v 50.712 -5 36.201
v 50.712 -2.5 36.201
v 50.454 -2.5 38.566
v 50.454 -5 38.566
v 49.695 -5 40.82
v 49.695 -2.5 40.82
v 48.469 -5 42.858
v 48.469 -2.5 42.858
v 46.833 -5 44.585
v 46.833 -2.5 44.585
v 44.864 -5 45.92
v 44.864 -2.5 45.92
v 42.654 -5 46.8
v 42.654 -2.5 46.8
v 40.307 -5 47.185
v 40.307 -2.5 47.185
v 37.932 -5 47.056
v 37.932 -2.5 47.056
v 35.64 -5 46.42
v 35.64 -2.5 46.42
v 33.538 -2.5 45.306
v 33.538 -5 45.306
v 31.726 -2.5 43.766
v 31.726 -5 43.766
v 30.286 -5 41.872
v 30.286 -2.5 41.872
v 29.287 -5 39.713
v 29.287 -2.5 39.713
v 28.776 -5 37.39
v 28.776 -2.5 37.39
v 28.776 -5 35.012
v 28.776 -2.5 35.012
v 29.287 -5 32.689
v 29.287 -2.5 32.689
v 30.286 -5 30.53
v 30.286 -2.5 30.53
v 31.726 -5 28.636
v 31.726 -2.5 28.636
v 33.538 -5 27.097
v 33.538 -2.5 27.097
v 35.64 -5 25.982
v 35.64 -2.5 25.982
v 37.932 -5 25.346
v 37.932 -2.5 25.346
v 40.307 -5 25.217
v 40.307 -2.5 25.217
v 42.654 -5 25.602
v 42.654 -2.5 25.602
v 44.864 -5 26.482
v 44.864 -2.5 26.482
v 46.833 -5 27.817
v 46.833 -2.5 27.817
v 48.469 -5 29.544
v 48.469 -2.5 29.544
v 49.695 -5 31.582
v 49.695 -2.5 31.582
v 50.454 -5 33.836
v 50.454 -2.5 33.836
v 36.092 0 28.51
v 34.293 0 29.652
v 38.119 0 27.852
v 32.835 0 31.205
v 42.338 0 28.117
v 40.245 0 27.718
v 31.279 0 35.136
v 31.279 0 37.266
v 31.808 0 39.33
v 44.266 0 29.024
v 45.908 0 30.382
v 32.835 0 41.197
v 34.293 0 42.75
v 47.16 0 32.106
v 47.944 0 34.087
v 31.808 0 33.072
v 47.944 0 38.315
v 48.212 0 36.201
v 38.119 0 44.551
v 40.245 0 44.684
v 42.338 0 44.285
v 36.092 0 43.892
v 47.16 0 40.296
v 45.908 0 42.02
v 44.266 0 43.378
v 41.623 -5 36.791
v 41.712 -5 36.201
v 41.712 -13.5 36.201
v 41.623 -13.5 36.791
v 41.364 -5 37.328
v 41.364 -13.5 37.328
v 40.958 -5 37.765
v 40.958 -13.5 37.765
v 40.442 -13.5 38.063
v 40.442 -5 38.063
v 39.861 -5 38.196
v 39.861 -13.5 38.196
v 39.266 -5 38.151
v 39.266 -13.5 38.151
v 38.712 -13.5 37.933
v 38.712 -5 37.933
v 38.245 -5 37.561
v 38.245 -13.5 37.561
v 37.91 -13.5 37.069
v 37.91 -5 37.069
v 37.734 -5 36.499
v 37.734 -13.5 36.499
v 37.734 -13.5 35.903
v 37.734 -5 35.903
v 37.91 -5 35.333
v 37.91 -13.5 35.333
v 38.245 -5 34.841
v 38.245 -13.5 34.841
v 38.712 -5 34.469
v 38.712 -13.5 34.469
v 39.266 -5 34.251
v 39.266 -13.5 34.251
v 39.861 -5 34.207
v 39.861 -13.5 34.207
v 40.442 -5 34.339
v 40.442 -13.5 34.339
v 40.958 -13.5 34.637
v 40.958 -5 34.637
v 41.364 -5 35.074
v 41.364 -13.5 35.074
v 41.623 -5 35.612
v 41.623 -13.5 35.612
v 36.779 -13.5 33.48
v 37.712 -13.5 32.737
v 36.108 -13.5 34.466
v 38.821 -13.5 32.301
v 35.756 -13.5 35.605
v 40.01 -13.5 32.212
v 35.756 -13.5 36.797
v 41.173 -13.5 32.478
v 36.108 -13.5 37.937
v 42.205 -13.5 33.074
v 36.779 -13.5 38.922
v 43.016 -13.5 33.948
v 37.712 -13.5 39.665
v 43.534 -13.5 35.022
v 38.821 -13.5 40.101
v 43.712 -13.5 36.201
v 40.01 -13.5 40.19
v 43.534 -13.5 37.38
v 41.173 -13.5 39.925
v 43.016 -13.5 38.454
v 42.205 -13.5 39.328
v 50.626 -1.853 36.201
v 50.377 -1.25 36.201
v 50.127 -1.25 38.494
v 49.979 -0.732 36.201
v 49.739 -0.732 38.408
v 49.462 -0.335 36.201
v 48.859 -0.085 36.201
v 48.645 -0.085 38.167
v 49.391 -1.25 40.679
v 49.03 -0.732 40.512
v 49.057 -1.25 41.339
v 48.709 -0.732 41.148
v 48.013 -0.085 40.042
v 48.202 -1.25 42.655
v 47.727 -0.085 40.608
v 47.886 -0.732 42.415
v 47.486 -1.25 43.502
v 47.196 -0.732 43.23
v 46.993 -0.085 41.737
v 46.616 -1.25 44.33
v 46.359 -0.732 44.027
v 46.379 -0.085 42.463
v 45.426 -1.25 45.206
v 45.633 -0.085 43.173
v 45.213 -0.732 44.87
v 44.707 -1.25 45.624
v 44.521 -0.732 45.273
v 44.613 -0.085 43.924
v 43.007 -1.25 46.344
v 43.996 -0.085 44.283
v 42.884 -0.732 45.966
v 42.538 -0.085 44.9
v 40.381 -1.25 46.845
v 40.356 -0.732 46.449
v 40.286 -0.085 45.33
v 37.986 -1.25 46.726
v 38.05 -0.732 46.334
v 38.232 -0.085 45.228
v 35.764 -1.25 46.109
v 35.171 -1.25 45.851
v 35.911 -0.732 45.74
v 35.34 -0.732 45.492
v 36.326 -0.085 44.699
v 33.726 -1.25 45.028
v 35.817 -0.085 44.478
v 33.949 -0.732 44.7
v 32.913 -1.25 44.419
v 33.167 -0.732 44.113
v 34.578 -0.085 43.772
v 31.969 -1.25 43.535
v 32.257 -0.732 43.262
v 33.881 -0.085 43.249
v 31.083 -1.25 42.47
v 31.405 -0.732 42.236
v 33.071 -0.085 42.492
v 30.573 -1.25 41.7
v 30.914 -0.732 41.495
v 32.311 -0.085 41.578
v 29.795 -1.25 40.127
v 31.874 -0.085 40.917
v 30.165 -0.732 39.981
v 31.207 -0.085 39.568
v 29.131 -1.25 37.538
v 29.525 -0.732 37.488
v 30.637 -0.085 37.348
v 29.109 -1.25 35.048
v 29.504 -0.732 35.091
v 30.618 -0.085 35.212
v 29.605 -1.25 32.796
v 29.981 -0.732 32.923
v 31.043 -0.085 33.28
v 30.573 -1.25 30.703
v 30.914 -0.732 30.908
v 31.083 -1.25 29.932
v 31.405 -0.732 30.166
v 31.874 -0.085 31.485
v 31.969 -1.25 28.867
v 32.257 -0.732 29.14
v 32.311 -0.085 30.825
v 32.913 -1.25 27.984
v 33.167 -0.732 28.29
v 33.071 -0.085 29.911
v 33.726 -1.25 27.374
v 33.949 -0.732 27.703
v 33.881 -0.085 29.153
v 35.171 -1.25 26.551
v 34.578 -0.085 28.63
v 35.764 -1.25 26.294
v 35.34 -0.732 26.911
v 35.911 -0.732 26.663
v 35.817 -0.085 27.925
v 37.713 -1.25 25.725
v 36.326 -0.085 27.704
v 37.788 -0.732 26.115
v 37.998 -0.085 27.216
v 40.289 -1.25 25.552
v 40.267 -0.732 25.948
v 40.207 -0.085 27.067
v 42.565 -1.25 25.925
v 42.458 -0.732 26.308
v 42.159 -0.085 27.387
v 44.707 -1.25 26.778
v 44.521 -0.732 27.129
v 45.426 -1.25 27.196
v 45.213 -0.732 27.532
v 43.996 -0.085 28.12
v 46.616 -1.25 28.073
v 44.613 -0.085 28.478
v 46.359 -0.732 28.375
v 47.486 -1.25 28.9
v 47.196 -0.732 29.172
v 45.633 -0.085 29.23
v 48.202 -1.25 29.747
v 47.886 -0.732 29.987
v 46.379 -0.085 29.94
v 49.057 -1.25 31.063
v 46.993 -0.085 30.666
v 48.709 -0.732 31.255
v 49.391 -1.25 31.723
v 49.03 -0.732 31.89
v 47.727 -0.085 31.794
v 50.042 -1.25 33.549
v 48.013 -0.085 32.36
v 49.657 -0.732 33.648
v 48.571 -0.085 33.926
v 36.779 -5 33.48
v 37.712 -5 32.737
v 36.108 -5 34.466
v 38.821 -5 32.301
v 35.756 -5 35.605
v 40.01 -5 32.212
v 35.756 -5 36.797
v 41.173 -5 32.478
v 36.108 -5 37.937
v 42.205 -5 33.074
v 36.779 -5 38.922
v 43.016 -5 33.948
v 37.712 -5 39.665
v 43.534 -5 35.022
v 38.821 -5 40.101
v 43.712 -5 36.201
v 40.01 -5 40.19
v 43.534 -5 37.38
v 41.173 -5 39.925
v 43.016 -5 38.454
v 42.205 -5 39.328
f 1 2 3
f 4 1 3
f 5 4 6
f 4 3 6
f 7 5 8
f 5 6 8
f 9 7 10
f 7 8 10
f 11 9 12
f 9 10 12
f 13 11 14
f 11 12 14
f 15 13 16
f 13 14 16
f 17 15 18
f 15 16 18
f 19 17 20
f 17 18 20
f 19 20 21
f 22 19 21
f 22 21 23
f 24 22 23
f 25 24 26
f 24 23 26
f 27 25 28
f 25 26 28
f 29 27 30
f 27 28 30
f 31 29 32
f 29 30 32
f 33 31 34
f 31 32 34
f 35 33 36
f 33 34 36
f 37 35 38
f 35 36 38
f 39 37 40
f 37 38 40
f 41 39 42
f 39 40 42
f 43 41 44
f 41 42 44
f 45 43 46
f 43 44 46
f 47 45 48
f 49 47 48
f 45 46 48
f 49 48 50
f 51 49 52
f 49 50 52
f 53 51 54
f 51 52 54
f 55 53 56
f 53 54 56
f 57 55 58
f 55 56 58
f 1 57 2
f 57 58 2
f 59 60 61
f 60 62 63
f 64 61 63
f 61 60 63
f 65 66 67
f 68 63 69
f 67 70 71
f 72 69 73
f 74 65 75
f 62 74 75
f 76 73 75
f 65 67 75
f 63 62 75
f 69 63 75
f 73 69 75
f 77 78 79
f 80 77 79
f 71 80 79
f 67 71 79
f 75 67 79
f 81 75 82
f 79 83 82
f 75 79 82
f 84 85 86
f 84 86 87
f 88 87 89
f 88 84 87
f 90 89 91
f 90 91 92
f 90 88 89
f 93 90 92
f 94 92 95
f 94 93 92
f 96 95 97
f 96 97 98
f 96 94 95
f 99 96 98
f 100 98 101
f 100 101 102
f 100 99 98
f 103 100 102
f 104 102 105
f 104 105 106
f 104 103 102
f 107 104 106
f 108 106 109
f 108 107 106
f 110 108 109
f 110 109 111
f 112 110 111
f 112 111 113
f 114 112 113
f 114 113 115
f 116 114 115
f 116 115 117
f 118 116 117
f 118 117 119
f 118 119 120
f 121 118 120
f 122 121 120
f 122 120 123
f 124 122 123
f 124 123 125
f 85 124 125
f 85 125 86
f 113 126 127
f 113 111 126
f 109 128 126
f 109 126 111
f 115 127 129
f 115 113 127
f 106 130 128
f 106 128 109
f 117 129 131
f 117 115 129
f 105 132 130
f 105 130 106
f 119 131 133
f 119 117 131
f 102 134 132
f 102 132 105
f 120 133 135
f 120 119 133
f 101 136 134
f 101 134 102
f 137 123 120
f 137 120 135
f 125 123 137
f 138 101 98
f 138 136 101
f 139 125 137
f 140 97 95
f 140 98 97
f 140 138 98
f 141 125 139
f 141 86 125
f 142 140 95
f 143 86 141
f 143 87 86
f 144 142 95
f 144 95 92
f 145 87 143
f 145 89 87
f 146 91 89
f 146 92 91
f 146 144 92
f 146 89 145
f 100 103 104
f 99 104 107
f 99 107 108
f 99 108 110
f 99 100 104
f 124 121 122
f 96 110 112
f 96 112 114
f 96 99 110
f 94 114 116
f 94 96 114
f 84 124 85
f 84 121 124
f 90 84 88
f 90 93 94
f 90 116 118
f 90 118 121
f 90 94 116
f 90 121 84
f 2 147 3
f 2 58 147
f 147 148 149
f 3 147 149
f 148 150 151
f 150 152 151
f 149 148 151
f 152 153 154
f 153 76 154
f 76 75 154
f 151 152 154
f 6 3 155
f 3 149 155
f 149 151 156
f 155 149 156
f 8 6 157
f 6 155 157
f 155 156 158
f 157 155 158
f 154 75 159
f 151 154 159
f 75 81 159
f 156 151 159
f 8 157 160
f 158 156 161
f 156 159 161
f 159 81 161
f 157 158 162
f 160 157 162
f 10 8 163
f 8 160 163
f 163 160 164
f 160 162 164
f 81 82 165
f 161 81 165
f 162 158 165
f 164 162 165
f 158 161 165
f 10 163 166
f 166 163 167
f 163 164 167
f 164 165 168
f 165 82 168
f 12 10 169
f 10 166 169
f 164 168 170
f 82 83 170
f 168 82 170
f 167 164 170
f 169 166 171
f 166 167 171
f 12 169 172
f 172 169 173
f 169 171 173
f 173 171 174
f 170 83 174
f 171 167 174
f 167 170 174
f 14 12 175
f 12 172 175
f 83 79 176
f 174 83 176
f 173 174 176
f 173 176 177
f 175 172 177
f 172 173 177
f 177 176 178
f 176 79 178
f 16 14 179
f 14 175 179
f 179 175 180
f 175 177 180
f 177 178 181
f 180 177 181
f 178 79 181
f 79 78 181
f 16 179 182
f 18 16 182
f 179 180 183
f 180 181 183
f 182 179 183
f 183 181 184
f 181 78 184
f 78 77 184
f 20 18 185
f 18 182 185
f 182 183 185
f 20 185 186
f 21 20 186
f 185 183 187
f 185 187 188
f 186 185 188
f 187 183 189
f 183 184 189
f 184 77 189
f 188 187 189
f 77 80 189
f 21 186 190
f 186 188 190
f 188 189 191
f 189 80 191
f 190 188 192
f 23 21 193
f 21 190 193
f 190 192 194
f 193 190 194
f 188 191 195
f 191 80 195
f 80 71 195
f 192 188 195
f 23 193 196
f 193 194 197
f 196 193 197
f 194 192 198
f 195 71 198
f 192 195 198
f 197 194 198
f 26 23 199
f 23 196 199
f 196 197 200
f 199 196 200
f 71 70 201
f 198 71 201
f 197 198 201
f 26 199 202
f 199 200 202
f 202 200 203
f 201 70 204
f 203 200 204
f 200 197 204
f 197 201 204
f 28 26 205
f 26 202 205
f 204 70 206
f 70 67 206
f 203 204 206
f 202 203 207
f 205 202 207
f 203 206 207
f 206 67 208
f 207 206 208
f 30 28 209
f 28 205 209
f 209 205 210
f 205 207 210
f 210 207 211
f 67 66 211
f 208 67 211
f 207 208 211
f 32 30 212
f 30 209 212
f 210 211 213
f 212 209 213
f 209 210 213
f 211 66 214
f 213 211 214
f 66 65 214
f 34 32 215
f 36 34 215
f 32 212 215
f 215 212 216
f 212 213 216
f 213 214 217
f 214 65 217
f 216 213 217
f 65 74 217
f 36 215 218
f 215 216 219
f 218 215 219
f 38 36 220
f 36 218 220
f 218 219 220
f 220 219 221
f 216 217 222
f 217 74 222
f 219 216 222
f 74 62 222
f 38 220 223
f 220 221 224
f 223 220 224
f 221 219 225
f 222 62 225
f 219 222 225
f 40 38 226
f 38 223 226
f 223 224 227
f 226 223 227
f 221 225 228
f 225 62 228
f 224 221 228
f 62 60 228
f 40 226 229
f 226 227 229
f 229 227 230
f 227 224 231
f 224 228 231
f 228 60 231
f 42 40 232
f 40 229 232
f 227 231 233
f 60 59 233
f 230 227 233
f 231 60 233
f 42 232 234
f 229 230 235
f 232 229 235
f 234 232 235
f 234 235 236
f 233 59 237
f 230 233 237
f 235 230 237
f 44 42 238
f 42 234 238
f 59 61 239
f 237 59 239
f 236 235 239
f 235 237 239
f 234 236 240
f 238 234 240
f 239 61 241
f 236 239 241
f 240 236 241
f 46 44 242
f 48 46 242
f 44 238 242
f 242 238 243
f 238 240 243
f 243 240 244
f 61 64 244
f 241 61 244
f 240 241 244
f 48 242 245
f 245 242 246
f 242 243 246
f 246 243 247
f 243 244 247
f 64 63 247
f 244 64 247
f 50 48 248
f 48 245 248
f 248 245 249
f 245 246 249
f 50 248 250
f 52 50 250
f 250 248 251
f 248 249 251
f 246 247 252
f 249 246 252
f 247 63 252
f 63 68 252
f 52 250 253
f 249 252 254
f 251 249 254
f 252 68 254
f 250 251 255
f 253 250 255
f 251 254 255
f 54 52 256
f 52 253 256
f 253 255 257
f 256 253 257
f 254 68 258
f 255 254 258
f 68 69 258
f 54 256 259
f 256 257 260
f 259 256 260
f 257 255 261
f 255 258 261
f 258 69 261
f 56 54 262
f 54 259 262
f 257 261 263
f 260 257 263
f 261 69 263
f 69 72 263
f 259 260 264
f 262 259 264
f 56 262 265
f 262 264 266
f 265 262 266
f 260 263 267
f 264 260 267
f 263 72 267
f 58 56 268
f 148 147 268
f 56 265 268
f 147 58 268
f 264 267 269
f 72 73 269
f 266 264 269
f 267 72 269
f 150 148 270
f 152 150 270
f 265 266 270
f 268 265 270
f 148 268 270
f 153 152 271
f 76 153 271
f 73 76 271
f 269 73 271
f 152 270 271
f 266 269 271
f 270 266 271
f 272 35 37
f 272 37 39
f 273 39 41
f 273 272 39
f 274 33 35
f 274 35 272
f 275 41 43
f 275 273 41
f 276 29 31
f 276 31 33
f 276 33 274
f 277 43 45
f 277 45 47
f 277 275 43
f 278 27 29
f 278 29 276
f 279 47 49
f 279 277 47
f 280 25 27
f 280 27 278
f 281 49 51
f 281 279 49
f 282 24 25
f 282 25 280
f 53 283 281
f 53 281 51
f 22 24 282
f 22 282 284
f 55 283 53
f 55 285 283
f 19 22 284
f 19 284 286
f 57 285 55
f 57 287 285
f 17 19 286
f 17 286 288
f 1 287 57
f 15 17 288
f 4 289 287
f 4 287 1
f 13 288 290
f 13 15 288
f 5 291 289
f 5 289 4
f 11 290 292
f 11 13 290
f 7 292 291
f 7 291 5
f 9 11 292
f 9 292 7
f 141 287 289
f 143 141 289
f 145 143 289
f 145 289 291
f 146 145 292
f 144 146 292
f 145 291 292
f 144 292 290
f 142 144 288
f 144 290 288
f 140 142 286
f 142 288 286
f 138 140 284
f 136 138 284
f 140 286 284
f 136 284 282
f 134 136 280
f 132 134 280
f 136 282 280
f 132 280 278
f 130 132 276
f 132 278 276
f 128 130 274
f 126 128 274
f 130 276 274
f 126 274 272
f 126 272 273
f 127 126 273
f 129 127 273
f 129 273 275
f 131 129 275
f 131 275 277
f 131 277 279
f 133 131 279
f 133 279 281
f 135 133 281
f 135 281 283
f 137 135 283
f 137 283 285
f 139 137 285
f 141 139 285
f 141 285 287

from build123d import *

# Parameters (mm, degrees)
F0_R     = 4
F0_R_2   = 2
F1_DEPTH = 13.5
F0_R_3   = 11
F2_DEPTH = 5
F3_R     = 2.5
F4_DEPTH = 5


with BuildPart() as f1:
    # F0 (on Front) → F1 (new body)
    with BuildSketch(Plane.XZ):
        with Locations((39.711516, 36.201108)):
            Circle(F0_R)
        with Locations((39.711516, 36.201108)):
            Circle(F0_R_2, mode=Mode.SUBTRACT)
    extrude(amount=F1_DEPTH)

    # F0 (on Front) → F2 (join)
    with BuildSketch(Plane.XZ):
        with Locations((39.711516, 36.201108)):
            Circle(F0_R_3)
        with Locations((39.711516, 36.201108)):
            Circle(F0_R, mode=Mode.SUBTRACT)
    extrude(amount=F2_DEPTH)

    # F3
    f3_edges = [f1.edges().sort_by_distance(p)[0] for p in [
        (28.711516, 0, 36.201108),
    ]]
    fillet(f3_edges, radius=F3_R)

    # F0 (on Front) → F4 (join)
    with BuildSketch(Plane.XZ):
        with Locations((39.711516, 36.201108)):
            Circle(F0_R_2)
    extrude(amount=F4_DEPTH)


solid = f1.part
